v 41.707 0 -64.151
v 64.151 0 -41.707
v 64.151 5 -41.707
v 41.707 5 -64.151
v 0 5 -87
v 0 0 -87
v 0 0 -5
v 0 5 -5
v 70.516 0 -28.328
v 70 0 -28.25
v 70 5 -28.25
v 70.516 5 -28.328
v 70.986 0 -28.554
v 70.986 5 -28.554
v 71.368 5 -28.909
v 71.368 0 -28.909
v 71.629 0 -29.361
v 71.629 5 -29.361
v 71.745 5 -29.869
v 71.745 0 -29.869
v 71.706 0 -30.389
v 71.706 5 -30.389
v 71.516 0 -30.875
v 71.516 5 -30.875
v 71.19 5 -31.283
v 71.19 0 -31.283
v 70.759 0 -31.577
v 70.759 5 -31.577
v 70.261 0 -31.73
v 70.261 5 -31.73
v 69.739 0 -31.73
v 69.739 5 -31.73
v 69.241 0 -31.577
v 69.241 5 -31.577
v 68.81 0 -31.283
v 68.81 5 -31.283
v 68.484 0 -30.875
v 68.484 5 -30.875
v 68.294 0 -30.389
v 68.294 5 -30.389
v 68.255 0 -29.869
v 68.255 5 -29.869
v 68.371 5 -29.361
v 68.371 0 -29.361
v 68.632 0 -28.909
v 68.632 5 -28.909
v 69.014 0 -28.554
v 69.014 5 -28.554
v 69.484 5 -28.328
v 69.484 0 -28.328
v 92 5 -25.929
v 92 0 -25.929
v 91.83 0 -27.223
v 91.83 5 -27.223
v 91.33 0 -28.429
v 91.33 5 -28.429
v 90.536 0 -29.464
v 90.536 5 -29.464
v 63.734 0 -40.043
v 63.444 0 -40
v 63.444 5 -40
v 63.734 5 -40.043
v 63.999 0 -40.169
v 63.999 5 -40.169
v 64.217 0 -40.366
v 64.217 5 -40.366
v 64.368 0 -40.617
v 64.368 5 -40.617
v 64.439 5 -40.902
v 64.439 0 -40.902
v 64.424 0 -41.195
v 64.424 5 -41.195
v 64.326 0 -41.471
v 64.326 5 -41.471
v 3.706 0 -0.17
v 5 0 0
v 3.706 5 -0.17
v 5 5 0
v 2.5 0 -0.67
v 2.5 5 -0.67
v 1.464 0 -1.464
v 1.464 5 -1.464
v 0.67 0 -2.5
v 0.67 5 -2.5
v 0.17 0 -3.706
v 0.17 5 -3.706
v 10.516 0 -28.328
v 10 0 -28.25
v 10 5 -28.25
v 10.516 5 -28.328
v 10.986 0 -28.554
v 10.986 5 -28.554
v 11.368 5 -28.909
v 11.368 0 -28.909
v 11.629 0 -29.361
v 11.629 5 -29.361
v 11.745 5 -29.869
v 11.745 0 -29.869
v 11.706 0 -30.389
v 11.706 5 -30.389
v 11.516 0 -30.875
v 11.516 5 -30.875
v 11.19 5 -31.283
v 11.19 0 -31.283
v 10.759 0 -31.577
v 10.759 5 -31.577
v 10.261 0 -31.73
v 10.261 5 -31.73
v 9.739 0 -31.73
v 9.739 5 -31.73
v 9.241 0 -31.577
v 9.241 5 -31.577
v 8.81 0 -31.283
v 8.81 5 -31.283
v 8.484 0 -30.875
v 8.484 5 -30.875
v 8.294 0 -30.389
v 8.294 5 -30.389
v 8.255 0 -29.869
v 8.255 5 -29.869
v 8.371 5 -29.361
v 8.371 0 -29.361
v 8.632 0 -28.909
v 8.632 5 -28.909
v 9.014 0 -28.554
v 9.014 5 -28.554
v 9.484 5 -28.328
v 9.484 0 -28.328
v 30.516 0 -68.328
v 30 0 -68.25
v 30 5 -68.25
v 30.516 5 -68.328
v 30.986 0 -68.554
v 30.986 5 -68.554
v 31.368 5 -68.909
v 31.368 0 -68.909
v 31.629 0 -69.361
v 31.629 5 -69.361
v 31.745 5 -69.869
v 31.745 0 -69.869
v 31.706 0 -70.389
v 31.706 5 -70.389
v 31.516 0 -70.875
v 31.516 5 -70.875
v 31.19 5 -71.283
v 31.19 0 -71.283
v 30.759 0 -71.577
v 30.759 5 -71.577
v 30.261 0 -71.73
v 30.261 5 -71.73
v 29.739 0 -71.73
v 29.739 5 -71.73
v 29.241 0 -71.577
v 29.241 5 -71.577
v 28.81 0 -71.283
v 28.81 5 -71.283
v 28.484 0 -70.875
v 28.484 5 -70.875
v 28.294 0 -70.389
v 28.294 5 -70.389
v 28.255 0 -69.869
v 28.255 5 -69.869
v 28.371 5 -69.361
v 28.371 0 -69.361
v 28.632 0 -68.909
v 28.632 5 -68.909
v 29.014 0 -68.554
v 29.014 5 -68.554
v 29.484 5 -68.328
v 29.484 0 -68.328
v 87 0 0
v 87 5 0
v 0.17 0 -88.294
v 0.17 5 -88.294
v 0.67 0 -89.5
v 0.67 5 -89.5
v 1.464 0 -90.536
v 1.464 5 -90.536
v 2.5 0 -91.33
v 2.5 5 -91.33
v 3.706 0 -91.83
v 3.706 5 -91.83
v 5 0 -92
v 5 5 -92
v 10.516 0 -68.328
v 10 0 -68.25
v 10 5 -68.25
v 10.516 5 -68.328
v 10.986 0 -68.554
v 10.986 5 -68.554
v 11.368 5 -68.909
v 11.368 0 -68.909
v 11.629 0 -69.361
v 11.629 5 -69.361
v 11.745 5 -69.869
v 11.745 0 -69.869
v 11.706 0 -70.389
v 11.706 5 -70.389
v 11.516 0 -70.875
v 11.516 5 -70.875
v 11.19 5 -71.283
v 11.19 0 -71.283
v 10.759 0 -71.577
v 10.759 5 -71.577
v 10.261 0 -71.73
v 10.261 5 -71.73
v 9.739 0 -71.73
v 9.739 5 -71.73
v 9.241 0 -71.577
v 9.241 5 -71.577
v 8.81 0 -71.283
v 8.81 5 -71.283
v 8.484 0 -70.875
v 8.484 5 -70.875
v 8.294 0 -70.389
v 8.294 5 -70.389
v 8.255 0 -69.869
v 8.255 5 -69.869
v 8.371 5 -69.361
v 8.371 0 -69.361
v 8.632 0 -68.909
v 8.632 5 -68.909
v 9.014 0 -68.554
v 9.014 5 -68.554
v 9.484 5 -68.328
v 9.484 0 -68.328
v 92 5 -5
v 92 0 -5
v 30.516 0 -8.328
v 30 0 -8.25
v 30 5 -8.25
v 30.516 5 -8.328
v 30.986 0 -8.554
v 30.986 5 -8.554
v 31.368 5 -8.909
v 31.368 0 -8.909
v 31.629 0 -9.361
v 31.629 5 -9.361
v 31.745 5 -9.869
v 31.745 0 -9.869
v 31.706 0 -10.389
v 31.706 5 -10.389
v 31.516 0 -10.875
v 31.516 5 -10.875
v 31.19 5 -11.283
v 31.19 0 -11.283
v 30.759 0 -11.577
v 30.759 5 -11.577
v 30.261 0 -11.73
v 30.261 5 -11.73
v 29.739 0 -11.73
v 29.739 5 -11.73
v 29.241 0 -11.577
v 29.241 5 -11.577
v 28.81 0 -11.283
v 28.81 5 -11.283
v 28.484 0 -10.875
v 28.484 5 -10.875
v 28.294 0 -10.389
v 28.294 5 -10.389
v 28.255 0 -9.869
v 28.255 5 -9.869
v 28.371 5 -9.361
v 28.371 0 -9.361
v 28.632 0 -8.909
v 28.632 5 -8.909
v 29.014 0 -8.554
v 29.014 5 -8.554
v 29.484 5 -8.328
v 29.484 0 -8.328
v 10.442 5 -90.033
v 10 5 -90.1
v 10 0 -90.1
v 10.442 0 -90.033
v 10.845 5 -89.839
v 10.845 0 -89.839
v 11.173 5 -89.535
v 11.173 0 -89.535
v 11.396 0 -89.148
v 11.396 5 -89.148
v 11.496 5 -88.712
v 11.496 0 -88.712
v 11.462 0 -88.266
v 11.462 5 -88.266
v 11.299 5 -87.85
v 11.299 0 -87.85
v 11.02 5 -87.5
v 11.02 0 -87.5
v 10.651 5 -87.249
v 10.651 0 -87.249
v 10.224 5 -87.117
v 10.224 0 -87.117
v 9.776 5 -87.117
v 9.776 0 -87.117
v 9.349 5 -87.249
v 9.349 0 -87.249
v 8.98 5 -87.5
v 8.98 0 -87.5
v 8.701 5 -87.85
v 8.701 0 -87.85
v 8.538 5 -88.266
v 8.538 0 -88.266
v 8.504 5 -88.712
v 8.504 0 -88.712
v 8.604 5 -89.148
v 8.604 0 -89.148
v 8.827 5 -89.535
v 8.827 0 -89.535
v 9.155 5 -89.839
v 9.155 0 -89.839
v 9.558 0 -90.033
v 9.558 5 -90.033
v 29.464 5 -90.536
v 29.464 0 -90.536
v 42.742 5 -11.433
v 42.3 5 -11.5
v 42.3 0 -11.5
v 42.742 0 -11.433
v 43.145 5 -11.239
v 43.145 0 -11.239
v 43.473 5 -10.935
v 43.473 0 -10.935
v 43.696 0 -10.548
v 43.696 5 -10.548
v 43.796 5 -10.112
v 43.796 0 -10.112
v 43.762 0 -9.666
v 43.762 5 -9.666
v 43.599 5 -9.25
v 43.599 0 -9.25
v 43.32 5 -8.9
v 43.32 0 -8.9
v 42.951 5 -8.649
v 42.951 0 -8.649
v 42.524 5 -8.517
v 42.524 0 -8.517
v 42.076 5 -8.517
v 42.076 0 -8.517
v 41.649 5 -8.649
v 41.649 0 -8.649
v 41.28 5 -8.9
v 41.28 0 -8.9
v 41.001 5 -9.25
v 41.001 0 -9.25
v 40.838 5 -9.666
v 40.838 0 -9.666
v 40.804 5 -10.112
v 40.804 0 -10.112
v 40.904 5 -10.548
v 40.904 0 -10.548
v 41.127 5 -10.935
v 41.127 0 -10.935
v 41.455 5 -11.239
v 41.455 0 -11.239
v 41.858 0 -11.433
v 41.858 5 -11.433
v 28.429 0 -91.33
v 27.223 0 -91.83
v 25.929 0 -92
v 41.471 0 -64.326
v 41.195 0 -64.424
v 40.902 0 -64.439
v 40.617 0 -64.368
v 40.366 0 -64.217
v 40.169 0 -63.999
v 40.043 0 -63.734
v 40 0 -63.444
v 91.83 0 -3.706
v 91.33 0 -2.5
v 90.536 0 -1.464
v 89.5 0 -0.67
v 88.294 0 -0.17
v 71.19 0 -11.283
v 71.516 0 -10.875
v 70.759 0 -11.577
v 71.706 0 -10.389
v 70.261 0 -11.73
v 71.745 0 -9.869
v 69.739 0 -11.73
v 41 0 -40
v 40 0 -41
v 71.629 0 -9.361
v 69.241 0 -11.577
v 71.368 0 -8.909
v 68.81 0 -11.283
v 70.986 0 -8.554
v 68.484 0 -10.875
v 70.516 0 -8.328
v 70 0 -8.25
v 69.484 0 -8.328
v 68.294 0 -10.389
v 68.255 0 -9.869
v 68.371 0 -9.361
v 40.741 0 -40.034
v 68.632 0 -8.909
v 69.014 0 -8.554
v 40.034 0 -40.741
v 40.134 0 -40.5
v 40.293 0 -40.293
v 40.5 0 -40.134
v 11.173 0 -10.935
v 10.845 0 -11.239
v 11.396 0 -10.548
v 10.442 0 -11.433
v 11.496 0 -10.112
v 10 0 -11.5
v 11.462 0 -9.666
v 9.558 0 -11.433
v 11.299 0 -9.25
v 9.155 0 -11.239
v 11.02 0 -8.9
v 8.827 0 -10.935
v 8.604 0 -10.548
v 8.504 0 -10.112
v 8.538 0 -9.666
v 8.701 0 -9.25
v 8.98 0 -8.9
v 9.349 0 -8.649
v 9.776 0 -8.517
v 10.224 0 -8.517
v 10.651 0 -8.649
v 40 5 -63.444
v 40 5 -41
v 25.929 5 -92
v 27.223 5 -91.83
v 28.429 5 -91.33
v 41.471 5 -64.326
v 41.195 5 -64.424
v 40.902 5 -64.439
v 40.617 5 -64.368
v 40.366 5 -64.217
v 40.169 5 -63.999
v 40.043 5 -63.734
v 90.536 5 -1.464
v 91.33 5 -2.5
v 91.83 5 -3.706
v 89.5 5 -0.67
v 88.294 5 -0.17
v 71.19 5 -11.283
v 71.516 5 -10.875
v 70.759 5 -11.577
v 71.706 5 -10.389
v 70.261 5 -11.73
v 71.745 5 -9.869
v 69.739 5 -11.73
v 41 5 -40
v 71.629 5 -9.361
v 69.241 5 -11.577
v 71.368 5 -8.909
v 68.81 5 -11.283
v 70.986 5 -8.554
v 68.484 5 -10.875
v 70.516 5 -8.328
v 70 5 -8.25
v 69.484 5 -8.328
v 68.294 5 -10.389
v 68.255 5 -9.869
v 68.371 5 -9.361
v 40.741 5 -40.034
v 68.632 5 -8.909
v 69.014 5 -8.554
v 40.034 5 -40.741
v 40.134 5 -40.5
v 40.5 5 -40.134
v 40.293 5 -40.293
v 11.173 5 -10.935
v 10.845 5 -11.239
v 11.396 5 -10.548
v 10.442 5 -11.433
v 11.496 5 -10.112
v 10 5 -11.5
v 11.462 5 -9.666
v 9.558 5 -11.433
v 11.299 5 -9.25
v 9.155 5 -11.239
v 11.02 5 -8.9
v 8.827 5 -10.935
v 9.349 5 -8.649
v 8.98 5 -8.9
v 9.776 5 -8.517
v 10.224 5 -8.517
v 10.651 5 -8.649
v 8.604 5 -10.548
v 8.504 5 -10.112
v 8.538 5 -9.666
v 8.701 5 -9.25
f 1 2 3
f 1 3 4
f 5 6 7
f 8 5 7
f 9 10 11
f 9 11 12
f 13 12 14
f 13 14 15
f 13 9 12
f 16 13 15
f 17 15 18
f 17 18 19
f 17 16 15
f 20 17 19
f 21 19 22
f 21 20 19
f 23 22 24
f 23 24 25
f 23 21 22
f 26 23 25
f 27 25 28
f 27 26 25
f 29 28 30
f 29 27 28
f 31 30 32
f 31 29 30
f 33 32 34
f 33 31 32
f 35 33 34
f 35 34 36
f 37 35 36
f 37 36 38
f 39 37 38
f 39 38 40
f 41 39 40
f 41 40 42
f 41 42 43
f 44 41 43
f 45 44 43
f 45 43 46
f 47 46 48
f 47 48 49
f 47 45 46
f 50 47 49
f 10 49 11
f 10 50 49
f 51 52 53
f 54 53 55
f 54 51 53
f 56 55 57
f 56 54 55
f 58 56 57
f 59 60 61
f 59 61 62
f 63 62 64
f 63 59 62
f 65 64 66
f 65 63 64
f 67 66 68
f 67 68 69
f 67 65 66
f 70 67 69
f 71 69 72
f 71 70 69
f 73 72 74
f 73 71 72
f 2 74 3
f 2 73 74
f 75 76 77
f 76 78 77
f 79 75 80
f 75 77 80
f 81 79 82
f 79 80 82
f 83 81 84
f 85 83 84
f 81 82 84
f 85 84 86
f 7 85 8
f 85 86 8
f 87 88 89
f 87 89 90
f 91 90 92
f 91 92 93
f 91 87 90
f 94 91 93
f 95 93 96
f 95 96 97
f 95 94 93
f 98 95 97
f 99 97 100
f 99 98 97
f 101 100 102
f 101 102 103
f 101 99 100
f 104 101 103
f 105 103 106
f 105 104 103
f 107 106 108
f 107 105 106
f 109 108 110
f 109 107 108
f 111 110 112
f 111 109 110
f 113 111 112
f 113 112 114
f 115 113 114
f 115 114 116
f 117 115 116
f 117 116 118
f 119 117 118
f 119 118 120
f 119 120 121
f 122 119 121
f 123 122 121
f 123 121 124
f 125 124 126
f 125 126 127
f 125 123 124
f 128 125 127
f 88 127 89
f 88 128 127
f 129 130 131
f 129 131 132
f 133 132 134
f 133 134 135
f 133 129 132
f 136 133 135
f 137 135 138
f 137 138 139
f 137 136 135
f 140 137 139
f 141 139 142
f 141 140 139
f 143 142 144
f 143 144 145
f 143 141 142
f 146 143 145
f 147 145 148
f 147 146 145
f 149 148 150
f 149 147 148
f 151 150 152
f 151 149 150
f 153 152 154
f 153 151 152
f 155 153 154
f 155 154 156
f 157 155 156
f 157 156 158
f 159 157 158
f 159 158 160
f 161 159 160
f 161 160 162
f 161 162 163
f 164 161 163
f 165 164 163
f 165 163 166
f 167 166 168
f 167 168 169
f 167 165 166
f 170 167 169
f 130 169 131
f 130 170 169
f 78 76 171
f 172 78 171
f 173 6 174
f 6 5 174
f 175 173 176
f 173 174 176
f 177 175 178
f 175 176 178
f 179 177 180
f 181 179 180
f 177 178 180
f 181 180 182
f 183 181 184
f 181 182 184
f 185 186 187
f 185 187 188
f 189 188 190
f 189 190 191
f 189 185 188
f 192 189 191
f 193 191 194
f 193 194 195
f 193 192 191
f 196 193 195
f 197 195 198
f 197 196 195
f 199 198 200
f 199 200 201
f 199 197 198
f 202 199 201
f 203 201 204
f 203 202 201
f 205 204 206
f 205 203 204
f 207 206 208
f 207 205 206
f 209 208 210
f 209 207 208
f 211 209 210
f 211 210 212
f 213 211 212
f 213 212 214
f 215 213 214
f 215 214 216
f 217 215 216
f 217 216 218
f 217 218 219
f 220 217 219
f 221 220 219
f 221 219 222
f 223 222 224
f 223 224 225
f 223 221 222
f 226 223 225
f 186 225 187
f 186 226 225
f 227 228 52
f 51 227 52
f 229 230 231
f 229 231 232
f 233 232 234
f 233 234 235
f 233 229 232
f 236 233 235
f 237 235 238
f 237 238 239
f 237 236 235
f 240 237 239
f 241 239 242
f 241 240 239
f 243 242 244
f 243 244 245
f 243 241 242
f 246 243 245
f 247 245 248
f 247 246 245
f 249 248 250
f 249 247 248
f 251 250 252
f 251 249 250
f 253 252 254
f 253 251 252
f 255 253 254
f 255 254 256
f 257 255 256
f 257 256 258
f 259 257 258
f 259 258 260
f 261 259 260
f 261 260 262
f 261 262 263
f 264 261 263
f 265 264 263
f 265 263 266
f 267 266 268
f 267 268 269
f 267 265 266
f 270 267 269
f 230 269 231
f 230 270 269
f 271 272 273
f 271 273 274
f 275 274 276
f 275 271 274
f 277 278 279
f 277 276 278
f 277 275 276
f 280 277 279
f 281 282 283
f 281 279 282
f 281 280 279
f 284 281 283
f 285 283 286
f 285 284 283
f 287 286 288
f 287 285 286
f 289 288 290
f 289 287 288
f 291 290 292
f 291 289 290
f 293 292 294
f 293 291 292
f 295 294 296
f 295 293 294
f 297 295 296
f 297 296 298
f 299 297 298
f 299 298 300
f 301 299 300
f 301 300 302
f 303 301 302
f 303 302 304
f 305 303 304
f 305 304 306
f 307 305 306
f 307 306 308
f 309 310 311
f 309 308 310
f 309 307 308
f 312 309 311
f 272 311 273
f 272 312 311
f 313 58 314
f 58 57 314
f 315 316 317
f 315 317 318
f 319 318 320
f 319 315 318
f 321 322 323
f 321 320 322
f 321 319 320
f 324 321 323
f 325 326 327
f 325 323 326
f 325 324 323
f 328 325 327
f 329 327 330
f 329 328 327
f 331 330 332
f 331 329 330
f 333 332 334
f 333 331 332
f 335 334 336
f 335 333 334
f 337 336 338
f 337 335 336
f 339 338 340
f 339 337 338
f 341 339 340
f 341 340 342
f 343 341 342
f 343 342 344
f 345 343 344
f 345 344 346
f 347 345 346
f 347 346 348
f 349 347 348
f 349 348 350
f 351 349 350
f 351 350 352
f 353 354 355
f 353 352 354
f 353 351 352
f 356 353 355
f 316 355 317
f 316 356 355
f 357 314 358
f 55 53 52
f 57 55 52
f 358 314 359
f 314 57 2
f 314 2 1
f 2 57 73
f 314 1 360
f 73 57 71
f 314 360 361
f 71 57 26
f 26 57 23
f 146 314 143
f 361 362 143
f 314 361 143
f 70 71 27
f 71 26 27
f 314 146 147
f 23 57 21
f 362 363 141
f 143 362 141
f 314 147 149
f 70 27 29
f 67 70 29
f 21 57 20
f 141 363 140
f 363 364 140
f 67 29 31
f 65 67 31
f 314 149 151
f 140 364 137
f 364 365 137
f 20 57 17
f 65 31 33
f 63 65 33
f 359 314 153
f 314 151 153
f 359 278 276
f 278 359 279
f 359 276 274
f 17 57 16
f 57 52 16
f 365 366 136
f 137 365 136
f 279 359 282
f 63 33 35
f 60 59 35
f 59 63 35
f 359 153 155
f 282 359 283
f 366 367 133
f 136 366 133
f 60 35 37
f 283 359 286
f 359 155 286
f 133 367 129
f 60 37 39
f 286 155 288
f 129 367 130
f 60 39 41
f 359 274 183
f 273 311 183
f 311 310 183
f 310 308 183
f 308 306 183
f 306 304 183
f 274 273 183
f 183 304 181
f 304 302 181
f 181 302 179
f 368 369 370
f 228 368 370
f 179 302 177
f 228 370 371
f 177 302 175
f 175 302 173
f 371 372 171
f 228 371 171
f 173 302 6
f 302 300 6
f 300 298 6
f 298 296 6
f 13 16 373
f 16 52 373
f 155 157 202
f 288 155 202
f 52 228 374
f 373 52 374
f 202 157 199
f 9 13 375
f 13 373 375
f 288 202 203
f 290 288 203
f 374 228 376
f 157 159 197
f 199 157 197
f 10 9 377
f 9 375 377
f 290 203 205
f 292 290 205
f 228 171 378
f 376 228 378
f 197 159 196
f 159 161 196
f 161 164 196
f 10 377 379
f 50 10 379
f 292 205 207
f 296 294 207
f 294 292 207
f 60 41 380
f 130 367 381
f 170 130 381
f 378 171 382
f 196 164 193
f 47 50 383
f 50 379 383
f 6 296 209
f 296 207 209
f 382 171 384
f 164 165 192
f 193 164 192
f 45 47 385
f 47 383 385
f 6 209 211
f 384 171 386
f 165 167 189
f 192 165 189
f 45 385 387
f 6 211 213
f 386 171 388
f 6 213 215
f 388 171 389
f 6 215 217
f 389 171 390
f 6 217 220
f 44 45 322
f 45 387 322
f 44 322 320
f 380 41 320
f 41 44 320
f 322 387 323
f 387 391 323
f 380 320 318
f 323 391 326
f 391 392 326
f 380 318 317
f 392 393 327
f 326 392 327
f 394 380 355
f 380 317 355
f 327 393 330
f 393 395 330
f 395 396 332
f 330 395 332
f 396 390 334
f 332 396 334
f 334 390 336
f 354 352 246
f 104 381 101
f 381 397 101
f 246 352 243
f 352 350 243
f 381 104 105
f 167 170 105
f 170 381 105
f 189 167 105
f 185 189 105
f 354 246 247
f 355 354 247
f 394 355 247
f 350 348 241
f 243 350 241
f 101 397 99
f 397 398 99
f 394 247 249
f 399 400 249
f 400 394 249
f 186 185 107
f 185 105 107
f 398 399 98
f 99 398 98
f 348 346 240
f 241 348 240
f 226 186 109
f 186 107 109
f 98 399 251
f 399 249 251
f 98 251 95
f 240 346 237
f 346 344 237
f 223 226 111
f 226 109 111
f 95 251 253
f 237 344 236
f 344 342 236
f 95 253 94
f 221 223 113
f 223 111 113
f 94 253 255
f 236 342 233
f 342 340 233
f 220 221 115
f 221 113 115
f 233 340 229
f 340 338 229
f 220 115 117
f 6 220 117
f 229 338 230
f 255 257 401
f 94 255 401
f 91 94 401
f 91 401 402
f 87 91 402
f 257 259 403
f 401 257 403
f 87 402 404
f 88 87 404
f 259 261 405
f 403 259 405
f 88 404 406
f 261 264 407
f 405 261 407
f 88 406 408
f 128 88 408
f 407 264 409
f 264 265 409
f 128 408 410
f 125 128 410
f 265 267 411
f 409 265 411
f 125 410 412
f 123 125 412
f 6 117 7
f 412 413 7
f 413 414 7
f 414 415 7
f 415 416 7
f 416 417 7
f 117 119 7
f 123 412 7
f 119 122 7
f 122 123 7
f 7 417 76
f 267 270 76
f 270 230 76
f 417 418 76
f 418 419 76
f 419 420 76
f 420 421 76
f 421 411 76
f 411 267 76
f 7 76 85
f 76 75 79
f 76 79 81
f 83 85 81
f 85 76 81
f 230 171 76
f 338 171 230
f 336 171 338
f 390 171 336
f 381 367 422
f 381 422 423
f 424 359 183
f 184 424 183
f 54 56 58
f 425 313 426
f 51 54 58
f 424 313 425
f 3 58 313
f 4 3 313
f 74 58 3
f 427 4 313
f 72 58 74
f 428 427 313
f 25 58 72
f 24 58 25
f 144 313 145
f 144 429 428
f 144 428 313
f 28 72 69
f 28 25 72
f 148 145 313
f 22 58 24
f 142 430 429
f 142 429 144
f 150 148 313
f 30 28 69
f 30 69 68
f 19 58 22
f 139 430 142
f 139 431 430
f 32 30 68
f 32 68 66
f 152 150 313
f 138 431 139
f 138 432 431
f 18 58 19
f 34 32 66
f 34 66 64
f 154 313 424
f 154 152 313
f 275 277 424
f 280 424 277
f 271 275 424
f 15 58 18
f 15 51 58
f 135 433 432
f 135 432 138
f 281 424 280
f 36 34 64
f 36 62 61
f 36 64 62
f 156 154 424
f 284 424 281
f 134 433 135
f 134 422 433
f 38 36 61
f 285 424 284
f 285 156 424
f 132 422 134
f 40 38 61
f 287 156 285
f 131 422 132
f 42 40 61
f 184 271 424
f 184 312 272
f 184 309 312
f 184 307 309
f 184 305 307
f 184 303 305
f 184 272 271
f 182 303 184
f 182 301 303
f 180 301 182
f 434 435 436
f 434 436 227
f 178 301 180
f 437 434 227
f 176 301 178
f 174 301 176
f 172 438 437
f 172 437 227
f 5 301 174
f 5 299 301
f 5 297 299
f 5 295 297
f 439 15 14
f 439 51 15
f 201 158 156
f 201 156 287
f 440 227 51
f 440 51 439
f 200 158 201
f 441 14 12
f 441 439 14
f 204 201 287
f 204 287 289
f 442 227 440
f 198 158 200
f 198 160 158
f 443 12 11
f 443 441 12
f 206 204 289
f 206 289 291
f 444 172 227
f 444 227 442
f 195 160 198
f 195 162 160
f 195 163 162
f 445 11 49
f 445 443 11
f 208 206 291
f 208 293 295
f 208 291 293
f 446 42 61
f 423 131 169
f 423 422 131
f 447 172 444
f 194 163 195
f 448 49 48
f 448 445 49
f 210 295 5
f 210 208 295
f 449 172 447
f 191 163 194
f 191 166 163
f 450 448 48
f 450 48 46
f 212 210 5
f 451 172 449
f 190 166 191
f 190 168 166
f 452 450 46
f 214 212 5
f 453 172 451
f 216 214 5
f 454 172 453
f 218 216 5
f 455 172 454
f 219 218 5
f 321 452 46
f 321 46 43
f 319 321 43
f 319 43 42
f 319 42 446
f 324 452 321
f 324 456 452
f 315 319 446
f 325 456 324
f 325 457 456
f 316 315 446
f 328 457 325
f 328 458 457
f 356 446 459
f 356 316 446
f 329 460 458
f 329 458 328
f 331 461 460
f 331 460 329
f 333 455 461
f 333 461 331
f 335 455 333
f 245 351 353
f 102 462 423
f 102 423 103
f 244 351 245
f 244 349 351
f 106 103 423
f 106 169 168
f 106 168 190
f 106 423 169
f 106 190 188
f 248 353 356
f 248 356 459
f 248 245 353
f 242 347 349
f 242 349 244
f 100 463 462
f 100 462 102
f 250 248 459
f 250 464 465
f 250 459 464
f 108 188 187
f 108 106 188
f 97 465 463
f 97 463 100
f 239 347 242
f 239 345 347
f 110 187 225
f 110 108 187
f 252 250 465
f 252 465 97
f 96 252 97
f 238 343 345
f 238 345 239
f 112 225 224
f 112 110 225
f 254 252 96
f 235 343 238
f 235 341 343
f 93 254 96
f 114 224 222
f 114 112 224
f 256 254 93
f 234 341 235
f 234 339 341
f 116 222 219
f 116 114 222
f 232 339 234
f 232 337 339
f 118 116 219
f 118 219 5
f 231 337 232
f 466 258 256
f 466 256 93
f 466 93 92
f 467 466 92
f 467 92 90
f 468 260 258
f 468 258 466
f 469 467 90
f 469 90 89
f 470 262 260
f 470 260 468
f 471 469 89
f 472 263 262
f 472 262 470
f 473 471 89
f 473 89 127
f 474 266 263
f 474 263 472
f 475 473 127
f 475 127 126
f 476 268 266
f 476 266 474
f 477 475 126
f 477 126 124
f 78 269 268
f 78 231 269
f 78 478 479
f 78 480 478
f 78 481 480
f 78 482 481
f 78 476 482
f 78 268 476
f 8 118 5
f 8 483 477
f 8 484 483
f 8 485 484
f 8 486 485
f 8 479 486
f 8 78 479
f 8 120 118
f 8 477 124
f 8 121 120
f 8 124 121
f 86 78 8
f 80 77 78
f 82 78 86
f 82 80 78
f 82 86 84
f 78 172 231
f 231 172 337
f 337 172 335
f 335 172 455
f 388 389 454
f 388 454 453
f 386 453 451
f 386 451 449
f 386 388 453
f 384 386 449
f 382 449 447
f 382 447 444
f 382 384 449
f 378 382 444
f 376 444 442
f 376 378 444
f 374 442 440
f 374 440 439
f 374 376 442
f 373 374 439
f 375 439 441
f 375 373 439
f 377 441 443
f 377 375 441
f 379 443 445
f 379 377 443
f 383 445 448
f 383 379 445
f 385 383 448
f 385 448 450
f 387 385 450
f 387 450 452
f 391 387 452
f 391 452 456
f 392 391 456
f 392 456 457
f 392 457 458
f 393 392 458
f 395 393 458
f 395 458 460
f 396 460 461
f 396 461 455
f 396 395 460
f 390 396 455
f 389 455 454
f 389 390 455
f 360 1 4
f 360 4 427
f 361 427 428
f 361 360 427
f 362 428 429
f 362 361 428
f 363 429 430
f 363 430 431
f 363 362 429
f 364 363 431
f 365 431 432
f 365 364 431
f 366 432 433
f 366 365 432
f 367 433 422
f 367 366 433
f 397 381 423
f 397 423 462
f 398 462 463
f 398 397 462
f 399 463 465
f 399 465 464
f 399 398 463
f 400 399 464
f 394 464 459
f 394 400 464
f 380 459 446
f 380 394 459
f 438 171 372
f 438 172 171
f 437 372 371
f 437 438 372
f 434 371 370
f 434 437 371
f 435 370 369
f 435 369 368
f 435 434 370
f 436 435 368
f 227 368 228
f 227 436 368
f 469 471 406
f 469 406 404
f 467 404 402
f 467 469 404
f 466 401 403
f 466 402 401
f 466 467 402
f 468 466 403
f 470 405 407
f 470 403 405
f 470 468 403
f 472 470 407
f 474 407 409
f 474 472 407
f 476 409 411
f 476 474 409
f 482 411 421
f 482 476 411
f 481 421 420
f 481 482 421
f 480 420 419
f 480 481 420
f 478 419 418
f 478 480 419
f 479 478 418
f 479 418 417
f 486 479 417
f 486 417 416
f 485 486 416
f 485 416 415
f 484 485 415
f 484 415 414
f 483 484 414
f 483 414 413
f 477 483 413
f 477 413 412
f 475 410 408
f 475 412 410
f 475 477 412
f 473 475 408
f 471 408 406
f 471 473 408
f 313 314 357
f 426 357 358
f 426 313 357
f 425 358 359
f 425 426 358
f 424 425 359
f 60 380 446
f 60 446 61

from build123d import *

# Parameters (mm, degrees)
ESBO_O1_R                  = 1.75
RESSALTO_EXTRUS_O1_DEPTH   = 5
RESSALTO_EXTRUS_O3_DEPTH   = 5
CORTE_EXTRUS_O1_DEPTH      = 131.203684057
CORTE_EXTRUS_O1_DEPTH_BACK = 131.203684057
ESBO_O3_R                  = 1.5
FILETE1_R                  = 5


with BuildPart() as part:
    # Esboço1 → Ressalto-extrusão1 (new body)
    with BuildSketch(Plane(origin=(0, 0, 0), x_dir=(1, 0, 0), z_dir=(0, 1, 0))):
        Polygon((0, 79.999998212), (0, 0), (79.999998212, 0), (79.999998212, 39.999999106), (39.999999106, 79.999998212), align=None)
        with Locations(Location((10, 69.999998212, 0), (0, 0, 270))):
            Circle(ESBO_O1_R, mode=Mode.SUBTRACT)
        with Locations(Location((30, 69.999998212, 0), (0, 0, 270))):
            Circle(ESBO_O1_R, mode=Mode.SUBTRACT)
        with Locations(Location((10, 29.999998212, 0), (0, 0, 270))):
            Circle(ESBO_O1_R, mode=Mode.SUBTRACT)
        with Locations(Location((69.999998212, 30, 0), (0, 0, 270))):
            Circle(ESBO_O1_R, mode=Mode.SUBTRACT)
        with Locations(Location((29.999998212, 10, 0), (0, 0, 270))):
            Circle(ESBO_O1_R, mode=Mode.SUBTRACT)
        with Locations(Location((69.999998212, 10, 0), (0, 0, 270))):
            Circle(ESBO_O1_R, mode=Mode.SUBTRACT)
        with BuildLine():
            Line((40, 63.443648132), (40, 41))
            ThreePointArc((40, 41), (40.292893219, 40.292893219), (41, 40))
            Line((41, 40), (63.443648132, 40))
            ThreePointArc((63.443648132, 40), (64.367527664, 40.617316568), (64.150754913, 41.707106781))
            Line((64.150754913, 41.707106781), (41.707106781, 64.150754913))
            ThreePointArc((41.707106781, 64.150754913), (40.617316568, 64.367527664), (40, 63.443648132))
        make_face(mode=Mode.SUBTRACT)
    extrude(amount=RESSALTO_EXTRUS_O1_DEPTH)

    # Esboço5 → Ressalto-extrusão3 (add)
    with BuildSketch(Plane.XZ):
        Polygon((79.999998212, 0), (91.999998212, 0), (91.999998212, -27.999999106), (79.999998212, -39.999999106), align=None)
        Polygon((39.999999106, -79.999998212), (27.999999106, -91.999998212), (0, -91.999998212), (0, -79.999998212), align=None)
    extrude(amount=-RESSALTO_EXTRUS_O3_DEPTH)

    # Esboço3 → Corte-extrusão1 (cut, two sides: drawn at the far end of the back side and taken through both)
    with BuildSketch(Plane.XZ.offset(-CORTE_EXTRUS_O1_DEPTH_BACK)):
        with Locations(Location((42.3, -10, 0), (0, 0, 270))):
            Circle(ESBO_O3_R)
        with Locations(Location((10, -88.6, 0), (0, 0, 270))):
            Circle(ESBO_O3_R)
        with Locations(Location((10, -10, 0), (0, 0, 270))):
            Circle(ESBO_O3_R)
    extrude(amount=CORTE_EXTRUS_O1_DEPTH + CORTE_EXTRUS_O1_DEPTH_BACK, mode=Mode.SUBTRACT)

    # Filete1
    filete1_edges = [part.edges().sort_by_distance(p)[0] for p in [
        (91.999998212, 2.5, -27.999999106),
        (91.999998212, 2.5, 0),
        (0, 2.5, -91.999998212),
        (27.999999106, 2.5, -91.999998212),
        (0, 2.5, 0),
    ]]
    fillet(filete1_edges, radius=FILETE1_R)


solid = part.part
